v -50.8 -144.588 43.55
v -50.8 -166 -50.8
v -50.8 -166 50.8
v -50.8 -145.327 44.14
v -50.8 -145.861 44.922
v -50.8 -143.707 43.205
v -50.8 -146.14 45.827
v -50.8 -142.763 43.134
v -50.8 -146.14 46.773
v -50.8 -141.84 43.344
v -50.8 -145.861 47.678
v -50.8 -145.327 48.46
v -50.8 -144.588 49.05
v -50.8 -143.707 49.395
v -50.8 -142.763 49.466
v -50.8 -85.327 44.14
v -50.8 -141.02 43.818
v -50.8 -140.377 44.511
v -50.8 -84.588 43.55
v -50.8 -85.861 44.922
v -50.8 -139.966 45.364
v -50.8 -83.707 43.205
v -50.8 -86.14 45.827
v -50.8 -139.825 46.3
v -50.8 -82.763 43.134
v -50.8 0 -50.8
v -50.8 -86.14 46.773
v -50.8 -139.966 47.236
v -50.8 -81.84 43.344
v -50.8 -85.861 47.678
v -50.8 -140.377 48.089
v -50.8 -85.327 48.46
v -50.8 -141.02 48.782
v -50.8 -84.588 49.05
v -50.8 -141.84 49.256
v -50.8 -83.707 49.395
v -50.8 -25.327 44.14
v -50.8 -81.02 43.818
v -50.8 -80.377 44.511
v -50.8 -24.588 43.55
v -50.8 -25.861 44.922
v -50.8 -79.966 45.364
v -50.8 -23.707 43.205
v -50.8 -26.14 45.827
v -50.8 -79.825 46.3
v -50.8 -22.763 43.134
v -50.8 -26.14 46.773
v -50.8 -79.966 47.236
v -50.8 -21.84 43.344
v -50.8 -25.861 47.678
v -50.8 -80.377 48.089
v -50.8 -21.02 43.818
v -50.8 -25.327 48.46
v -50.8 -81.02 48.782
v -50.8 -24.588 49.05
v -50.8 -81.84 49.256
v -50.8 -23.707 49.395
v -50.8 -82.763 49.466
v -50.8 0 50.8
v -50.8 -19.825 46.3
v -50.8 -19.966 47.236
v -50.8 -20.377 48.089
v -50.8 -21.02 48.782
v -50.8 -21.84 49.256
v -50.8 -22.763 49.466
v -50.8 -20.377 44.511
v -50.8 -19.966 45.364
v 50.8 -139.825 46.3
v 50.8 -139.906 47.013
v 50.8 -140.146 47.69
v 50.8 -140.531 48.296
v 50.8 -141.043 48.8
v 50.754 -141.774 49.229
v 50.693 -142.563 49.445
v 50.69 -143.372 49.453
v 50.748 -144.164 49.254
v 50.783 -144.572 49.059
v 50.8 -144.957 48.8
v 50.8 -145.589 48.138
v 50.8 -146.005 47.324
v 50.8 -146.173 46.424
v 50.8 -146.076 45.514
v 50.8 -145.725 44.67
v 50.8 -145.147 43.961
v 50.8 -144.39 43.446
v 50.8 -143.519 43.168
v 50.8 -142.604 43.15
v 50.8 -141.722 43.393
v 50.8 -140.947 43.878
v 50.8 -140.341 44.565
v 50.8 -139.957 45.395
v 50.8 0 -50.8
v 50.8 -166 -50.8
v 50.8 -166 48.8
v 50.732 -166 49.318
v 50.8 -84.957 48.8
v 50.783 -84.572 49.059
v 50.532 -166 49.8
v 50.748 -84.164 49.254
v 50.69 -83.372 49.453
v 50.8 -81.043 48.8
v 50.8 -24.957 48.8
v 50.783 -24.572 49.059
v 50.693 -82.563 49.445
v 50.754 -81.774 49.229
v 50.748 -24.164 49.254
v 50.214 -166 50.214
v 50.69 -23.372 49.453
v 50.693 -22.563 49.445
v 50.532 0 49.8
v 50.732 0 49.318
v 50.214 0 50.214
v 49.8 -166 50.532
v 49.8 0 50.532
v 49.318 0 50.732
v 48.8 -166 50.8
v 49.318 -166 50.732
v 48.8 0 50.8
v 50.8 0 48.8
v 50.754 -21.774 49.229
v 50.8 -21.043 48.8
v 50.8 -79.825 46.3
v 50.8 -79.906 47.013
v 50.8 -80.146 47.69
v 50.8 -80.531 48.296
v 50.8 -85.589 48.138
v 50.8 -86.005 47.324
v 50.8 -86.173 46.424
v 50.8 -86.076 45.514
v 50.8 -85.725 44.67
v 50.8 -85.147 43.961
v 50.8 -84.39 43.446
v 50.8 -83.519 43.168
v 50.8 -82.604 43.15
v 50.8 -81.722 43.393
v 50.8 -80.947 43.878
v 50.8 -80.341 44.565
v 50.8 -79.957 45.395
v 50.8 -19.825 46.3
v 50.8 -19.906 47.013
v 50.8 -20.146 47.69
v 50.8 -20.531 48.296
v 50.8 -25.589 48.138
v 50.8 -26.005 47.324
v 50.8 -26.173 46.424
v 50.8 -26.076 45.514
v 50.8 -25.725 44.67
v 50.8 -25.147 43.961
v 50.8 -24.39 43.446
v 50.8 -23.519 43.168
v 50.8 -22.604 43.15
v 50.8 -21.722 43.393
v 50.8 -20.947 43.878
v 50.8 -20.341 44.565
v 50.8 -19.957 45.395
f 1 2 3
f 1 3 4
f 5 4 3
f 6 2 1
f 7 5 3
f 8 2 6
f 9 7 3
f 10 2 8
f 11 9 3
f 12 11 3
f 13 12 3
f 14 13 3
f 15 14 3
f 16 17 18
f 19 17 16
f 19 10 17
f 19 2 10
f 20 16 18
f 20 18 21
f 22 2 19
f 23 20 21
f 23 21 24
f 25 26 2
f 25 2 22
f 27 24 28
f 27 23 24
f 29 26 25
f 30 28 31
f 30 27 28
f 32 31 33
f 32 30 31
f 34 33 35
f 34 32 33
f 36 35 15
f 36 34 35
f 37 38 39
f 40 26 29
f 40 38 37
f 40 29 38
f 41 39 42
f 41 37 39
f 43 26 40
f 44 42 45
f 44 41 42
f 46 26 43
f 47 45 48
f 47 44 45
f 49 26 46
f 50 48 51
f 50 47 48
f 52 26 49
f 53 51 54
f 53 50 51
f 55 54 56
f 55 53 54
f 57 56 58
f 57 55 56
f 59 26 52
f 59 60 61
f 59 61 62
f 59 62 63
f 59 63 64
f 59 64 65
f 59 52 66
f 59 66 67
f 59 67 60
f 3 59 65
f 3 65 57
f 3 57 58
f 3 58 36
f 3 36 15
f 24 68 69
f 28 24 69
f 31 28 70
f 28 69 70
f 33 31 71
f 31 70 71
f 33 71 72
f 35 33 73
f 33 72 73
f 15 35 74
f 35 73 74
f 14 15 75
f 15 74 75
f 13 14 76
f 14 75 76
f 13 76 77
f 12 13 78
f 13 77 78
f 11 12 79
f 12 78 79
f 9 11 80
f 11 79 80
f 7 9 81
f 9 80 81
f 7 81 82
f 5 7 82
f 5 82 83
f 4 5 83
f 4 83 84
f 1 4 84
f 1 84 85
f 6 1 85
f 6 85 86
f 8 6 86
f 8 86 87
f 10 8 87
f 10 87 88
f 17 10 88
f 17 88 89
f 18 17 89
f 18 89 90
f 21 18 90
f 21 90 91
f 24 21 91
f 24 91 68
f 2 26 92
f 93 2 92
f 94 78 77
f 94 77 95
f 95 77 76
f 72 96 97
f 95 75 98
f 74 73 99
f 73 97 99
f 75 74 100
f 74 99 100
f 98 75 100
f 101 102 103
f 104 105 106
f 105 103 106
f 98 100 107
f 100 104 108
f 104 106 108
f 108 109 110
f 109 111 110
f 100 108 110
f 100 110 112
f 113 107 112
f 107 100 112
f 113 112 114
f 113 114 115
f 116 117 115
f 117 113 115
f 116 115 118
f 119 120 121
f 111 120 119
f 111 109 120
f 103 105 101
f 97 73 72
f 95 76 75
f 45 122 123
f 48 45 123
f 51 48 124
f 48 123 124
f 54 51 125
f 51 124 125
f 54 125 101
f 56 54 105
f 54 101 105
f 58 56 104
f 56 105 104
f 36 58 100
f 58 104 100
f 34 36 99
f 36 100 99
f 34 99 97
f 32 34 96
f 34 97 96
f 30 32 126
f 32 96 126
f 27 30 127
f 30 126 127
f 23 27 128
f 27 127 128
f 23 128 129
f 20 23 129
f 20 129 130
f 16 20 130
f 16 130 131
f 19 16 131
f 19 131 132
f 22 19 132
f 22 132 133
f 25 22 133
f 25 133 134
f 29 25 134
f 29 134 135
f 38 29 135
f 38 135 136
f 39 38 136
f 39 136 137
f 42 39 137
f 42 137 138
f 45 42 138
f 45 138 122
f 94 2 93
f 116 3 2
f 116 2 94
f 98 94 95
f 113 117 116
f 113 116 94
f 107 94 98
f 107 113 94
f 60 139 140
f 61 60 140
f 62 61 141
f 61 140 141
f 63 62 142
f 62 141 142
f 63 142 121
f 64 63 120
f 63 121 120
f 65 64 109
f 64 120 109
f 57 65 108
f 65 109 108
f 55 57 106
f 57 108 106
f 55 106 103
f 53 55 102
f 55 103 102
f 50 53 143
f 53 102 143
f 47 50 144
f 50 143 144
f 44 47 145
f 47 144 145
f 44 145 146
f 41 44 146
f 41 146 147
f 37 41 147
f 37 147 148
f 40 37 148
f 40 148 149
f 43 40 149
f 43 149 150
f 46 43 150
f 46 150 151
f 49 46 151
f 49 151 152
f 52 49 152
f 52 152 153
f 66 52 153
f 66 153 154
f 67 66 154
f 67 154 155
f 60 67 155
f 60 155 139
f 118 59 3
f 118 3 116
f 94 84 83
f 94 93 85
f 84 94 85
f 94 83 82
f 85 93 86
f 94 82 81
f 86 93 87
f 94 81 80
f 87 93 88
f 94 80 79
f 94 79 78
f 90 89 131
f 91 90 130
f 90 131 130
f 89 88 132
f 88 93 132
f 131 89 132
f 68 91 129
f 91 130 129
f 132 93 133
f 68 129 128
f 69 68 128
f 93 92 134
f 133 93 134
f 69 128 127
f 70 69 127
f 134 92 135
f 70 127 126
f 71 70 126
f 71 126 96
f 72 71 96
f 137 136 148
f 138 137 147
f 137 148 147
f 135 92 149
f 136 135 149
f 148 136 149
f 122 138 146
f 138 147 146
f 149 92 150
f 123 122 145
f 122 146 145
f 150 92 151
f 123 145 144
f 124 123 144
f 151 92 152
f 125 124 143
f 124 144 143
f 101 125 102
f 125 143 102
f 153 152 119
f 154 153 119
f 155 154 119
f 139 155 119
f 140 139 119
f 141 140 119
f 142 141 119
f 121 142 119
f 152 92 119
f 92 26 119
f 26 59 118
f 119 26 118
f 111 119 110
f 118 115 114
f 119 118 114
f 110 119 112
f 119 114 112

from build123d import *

# Parameters (mm, degrees)
F0_W        = 101.6
F0_H        = 101.6
F1_DEPTH    = 166
F2_R        = 3.175
F3_DEPTH    = 101.601
F4_T1_DEPTH = 176


# Not quite as in the source:
# - a fillet or chamfer that OpenCascade refuses, or shapes differently, is made with other operations: its cross-section is extruded or revolved along the edge and cut away or added


with BuildPart() as f1:
    # F0 (on Front) → F1 (new body)
    with BuildSketch(Plane.XZ):
        Rectangle(F0_W, F0_H)
    extrude(amount=F1_DEPTH)

    # F2 (on face) → F3 (cut, through all)
    with BuildSketch(Plane.YZ.offset(50.8)):
        with Locations((-143, 46.3)):
            Circle(F2_R)
        with Locations((-83, 46.3)):
            Circle(F2_R)
        with Locations((-23, 46.3)):
            Circle(F2_R)
    extrude(amount=-F3_DEPTH, mode=Mode.SUBTRACT)

    # F4: fillet of radius 2 on 1 edges, made by hand

    # F4_s2 → F4_t1 (cut)
    with BuildSketch(Plane.XZ.offset(-5)):
        with BuildLine():
            ThreePointArc((50.8, 48.8), (50.2142135624, 50.2142135624), (48.8, 50.8))
            Line((48.8, 50.8), (50.8, 50.8))
            Line((50.8, 50.8), (50.8, 48.8))
        make_face()
    extrude(amount=F4_T1_DEPTH, mode=Mode.SUBTRACT)


solid = f1.part
